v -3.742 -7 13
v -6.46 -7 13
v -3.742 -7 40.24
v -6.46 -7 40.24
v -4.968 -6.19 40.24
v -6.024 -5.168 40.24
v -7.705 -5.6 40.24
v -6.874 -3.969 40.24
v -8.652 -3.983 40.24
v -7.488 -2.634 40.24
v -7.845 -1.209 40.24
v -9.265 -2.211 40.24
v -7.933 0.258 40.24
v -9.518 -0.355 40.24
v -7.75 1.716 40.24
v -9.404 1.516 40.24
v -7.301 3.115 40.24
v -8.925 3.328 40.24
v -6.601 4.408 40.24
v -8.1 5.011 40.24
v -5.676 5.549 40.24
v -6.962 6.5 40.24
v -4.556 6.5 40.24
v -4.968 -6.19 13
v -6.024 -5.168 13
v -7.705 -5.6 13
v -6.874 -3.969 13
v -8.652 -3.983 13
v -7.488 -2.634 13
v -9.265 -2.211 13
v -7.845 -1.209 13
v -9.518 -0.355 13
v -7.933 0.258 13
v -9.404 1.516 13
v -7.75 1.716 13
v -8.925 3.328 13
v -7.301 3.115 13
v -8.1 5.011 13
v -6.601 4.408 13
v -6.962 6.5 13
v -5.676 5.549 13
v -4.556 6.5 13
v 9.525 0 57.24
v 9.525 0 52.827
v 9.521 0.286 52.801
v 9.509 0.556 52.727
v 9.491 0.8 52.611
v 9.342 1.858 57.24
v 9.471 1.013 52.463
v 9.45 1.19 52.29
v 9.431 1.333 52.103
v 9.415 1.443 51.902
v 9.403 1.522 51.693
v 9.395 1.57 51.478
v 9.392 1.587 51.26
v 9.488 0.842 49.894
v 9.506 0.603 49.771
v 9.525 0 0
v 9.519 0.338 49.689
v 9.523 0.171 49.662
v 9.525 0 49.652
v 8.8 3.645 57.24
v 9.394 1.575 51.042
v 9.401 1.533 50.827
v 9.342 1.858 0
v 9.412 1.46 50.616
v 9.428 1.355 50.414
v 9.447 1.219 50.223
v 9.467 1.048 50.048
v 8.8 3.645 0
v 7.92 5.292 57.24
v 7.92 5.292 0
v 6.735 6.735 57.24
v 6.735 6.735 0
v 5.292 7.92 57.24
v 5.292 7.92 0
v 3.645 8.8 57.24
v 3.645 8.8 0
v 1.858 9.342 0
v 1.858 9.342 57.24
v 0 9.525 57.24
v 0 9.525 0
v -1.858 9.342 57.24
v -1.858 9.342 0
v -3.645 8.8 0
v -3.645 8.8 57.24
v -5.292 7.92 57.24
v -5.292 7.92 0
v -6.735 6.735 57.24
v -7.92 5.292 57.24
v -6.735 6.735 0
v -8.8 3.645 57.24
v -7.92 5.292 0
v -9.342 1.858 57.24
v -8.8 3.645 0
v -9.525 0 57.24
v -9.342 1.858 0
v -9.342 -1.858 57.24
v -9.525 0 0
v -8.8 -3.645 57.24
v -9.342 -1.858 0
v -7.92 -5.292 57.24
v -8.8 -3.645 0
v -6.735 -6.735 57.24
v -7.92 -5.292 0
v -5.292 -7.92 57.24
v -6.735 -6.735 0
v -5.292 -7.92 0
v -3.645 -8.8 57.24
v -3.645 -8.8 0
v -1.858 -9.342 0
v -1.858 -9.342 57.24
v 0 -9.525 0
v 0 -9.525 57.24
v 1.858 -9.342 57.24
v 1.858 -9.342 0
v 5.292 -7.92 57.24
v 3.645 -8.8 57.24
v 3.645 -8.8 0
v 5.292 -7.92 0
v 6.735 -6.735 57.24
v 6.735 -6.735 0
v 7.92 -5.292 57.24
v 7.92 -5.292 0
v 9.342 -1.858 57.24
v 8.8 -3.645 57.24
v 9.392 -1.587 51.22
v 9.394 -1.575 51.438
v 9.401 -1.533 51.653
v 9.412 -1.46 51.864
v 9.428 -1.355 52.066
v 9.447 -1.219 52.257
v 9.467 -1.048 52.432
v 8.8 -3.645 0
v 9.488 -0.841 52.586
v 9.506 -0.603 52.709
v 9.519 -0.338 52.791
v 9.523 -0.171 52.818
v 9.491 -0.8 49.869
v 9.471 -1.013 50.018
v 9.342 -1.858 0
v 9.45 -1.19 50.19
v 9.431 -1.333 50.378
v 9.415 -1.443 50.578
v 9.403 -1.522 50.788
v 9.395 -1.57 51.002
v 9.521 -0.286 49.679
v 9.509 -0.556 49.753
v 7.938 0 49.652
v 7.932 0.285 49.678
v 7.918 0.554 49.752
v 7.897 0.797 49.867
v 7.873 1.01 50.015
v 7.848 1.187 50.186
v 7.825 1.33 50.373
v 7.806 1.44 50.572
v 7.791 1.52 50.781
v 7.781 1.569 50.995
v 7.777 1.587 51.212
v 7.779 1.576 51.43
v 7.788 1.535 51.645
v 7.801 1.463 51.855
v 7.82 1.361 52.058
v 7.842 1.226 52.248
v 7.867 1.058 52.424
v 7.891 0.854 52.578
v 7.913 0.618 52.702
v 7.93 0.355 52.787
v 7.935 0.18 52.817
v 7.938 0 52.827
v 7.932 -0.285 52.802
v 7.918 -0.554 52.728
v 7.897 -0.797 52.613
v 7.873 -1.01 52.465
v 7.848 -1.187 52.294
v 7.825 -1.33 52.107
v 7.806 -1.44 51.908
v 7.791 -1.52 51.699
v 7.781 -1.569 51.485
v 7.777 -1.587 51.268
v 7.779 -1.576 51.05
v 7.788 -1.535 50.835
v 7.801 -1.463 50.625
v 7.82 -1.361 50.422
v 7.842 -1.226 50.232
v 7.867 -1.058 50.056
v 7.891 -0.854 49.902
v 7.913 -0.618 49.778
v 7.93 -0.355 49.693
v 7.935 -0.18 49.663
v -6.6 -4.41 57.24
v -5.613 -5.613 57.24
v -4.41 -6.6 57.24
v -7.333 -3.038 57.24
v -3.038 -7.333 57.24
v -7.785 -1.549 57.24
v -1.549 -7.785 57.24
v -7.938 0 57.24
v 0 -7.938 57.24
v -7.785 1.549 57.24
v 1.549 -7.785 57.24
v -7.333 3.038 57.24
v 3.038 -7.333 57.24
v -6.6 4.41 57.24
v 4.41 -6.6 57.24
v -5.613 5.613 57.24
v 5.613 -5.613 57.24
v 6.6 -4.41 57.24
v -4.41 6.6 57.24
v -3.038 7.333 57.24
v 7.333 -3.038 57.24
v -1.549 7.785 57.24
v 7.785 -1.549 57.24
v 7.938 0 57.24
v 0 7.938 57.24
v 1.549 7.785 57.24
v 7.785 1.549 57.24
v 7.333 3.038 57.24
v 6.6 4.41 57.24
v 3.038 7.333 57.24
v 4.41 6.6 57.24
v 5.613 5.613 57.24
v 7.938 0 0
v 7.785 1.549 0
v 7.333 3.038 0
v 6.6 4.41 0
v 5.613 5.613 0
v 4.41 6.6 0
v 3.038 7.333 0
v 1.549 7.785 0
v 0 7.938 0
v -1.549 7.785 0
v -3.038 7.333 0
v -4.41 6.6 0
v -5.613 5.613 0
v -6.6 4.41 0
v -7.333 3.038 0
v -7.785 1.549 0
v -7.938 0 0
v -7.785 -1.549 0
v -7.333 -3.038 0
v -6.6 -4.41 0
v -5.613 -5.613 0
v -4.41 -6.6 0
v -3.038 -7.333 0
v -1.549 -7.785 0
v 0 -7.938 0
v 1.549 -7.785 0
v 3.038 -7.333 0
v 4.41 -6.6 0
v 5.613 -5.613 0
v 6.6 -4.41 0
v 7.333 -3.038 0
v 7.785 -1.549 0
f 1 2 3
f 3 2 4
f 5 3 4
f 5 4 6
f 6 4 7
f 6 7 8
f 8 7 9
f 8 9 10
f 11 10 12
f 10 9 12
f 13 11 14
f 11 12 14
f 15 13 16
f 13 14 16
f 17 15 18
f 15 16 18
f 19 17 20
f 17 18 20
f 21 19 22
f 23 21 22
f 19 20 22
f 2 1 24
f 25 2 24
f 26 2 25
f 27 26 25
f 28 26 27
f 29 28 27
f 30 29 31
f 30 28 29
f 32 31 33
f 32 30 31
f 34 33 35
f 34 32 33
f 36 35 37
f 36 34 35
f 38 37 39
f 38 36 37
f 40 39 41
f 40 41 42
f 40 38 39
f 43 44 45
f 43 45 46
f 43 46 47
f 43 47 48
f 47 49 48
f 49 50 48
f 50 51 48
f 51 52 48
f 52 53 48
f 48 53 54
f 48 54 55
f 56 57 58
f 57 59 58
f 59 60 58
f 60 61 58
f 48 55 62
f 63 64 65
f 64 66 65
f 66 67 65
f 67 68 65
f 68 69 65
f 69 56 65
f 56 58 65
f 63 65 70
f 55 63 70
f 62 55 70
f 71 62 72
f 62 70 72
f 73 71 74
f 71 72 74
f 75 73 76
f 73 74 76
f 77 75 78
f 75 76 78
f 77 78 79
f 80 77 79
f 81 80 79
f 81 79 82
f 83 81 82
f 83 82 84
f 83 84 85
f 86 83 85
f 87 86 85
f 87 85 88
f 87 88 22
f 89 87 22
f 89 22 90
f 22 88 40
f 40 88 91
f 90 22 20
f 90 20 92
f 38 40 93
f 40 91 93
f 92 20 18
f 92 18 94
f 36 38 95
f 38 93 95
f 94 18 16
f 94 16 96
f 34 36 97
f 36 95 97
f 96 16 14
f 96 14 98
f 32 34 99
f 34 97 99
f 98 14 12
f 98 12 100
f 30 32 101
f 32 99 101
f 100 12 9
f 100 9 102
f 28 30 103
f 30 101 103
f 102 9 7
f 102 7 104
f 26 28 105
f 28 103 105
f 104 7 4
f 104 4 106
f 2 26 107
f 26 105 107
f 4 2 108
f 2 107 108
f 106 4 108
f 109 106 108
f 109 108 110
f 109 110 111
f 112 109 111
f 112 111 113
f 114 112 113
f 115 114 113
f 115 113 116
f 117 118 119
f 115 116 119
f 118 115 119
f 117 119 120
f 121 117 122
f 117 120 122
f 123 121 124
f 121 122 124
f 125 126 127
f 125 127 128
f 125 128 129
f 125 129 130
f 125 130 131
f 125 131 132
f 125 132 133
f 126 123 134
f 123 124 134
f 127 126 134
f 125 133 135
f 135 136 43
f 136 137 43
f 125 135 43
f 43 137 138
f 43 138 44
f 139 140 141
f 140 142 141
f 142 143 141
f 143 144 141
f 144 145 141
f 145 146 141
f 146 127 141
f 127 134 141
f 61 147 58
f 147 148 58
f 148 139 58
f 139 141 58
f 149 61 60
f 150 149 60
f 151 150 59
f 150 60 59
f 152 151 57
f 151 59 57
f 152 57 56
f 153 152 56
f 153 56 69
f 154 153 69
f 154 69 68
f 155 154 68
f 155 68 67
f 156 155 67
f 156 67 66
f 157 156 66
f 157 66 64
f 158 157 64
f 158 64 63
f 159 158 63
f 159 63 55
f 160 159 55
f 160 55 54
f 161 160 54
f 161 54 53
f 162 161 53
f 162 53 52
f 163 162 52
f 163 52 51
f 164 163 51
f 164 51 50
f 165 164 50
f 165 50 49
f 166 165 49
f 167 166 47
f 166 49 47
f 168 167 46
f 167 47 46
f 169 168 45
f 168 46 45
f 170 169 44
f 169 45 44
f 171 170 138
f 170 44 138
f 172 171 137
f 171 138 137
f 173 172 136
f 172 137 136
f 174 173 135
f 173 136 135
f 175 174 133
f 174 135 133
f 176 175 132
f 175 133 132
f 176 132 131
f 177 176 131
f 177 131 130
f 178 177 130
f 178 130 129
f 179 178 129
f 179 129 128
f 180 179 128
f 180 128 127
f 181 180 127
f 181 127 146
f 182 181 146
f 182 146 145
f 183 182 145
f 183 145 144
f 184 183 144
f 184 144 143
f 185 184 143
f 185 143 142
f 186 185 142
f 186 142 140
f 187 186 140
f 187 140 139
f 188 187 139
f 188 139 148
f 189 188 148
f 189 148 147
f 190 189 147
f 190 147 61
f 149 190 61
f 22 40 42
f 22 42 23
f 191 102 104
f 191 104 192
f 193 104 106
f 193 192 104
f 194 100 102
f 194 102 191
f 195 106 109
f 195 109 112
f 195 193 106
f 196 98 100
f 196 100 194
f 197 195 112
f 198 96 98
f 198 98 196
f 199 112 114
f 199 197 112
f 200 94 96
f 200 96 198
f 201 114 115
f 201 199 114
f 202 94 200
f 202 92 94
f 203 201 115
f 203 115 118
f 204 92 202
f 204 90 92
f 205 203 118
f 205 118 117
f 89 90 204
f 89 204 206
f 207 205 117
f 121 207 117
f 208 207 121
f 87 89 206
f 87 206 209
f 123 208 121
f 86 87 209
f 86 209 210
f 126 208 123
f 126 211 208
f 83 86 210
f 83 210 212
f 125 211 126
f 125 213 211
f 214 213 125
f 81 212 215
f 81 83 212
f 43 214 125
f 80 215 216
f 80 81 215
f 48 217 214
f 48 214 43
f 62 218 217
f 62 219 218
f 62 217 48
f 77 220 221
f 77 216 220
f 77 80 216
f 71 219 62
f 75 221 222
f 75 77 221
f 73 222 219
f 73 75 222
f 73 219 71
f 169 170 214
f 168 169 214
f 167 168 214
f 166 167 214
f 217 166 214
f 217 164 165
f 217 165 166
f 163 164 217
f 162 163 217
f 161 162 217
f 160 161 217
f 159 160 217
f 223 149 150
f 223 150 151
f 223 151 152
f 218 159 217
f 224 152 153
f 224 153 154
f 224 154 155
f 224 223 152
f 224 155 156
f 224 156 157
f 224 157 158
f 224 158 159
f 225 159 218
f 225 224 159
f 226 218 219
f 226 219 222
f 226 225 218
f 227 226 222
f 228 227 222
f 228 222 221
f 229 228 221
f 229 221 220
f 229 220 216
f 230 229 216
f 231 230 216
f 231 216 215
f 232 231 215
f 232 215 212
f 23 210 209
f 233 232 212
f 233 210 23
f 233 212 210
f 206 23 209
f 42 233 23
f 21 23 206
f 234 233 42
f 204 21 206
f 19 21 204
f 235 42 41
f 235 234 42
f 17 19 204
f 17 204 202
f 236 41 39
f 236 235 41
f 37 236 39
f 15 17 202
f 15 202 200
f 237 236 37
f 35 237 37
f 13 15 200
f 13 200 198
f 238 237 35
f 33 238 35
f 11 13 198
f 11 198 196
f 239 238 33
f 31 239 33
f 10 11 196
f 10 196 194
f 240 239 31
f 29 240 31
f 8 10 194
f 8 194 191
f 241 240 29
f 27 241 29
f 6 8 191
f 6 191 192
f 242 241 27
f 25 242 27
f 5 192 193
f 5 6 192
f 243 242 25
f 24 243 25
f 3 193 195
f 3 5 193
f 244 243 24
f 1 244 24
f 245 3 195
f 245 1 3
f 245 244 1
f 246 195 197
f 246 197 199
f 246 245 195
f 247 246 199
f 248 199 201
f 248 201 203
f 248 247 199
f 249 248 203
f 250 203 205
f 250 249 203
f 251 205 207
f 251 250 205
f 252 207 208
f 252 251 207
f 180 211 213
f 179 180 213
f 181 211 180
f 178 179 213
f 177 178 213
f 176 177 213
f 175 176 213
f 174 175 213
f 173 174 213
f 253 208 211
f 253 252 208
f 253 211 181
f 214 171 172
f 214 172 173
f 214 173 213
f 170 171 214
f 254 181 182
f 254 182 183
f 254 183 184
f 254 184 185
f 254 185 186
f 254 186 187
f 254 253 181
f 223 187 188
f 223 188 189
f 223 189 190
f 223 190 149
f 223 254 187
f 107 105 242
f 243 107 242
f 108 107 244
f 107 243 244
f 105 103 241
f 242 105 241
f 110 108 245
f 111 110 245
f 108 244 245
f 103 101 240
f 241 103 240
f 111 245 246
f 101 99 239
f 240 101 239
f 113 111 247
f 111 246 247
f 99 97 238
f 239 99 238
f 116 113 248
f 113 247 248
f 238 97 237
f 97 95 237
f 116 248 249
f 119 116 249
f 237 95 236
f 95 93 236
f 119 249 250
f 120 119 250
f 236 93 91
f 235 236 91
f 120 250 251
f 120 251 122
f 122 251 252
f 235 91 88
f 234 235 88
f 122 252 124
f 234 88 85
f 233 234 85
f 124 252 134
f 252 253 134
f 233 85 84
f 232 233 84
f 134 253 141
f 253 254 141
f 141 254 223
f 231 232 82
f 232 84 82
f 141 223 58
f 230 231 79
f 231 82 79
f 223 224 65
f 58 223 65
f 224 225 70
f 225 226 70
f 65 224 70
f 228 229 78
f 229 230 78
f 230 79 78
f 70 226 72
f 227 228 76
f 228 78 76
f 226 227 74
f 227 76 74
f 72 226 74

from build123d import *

# Parameters (mm, degrees)
SKETCH1_R           = 9.525
SKETCH1_R_2         = 7.9375
BOSS_EXTRUDE1_DEPTH = 57.239999911
CUT_EXTRUDE1_REACH  = 21.05
SKETCH2_R           = 1.5875
CUT_EXTRUDE2_REACH  = 21.05
SKETCH3_W           = 27.239999911
SKETCH3_H           = 13.5


with BuildPart() as part:
    # Sketch1 → Boss-Extrude1 (new body)
    with BuildSketch(Plane.XY):
        Circle(SKETCH1_R)
        Circle(SKETCH1_R_2, mode=Mode.SUBTRACT)
    extrude(amount=BOSS_EXTRUDE1_DEPTH)

    # Sketch2 → Cut-Extrude1 (cut, up to next)
    with BuildSketch(Plane(origin=(9.525, 0, 0), x_dir=(0, 0, -1), z_dir=(1, 0, 0)), mode=Mode.PRIVATE) as cut_extrude1_sk1:
        with Locations((-51.239999911, 0)):
            Circle(SKETCH2_R)
    cut_extrude1_tool1 = extrude(cut_extrude1_sk1.sketch, amount=-CUT_EXTRUDE1_REACH, mode=Mode.PRIVATE) & part.part
    add(cut_extrude1_tool1.solids().sort_by_distance((9.525, 0, 51.24))[0], mode=Mode.SUBTRACT)

    # Sketch3 → Cut-Extrude2 (cut, up to next)
    with BuildSketch(Plane.ZY.offset(9.525), mode=Mode.PRIVATE) as cut_extrude2_sk1:
        with Locations((26.619999956, -0.25)):
            Rectangle(SKETCH3_W, SKETCH3_H)
    cut_extrude2_tool1 = extrude(cut_extrude2_sk1.sketch, amount=-CUT_EXTRUDE2_REACH, mode=Mode.PRIVATE) & part.part
    add(cut_extrude2_tool1.solids().sort_by_distance((-9.525, -0.25, 26.62))[0], mode=Mode.SUBTRACT)


solid = part.part
